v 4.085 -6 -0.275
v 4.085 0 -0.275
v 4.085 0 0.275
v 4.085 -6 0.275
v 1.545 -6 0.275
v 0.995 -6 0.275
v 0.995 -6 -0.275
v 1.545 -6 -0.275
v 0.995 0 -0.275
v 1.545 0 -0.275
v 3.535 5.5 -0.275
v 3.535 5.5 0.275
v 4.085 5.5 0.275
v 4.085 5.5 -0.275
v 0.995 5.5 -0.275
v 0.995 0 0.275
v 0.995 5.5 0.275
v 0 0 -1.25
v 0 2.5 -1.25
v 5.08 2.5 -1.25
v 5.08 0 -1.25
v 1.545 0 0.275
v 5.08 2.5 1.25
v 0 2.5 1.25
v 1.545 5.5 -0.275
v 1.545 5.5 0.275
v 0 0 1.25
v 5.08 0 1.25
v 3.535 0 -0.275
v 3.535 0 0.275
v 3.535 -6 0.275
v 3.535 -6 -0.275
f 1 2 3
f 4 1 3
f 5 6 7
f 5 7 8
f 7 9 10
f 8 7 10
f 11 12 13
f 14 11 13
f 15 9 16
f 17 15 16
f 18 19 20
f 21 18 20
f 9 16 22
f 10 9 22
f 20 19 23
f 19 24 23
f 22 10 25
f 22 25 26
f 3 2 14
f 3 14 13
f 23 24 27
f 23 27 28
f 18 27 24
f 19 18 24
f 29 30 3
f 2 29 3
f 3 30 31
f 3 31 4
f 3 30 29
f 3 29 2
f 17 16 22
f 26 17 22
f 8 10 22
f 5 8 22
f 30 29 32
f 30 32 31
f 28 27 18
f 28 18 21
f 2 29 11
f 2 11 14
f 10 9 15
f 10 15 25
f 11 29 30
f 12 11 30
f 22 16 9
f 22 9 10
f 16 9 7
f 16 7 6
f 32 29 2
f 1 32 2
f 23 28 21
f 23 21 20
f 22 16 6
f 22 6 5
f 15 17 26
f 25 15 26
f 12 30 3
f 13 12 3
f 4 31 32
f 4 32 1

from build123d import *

# Parameters (mm, degrees)
SKETCH1_W             = 5.08
SKETCH1_H             = 2.5
BOSS_EXTRUDE1_DEPTH   = 1.25
SKETCH2_W             = 0.55
SKETCH2_H             = 0.55
BOSS_EXTRUDE2_DEPTH   = 6
BOSS_EXTRUDE2_2_DEPTH = 6
SKETCH2_2_W           = 0.55
SKETCH2_2_H           = 0.55
BOSS_EXTRUDE3_DEPTH   = 5.5
BOSS_EXTRUDE3_2_DEPTH = 5.5


with BuildPart() as part:
    # Sketch1 → Boss-Extrude1 (new body, symmetric)
    with BuildSketch(Plane.XY):
        with Locations((2.54, 1.25)):
            Rectangle(SKETCH1_W, SKETCH1_H)
    extrude(amount=BOSS_EXTRUDE1_DEPTH, both=True)


with BuildPart() as body_2:
    # Sketch2 → Boss-Extrude2 (new body)
    with BuildSketch(Plane.XZ):
        with Locations((3.81, 0)):
            Rectangle(SKETCH2_W, SKETCH2_H)
    extrude(amount=BOSS_EXTRUDE2_DEPTH)


with BuildPart() as body_3:
    # Sketch2 → Boss-Extrude2 2 (new body)
    with BuildSketch(Plane.XZ):
        with Locations((1.27, 0)):
            Rectangle(SKETCH2_W, SKETCH2_H)
    extrude(amount=BOSS_EXTRUDE2_2_DEPTH)


with BuildPart() as body_4:
    # Sketch2<2> → Boss-Extrude3 (new body)
    with BuildSketch(Plane.XZ):
        with Locations((3.81, 0)):
            Rectangle(SKETCH2_2_W, SKETCH2_2_H)
    extrude(amount=-BOSS_EXTRUDE3_DEPTH)


with BuildPart() as body_5:
    # Sketch2<2> → Boss-Extrude3 2 (new body)
    with BuildSketch(Plane.XZ):
        with Locations((1.27, 0)):
            Rectangle(SKETCH2_2_W, SKETCH2_2_H)
    extrude(amount=-BOSS_EXTRUDE3_2_DEPTH)


solid = Compound([part.part, body_2.part, body_3.part, body_4.part, body_5.part])
